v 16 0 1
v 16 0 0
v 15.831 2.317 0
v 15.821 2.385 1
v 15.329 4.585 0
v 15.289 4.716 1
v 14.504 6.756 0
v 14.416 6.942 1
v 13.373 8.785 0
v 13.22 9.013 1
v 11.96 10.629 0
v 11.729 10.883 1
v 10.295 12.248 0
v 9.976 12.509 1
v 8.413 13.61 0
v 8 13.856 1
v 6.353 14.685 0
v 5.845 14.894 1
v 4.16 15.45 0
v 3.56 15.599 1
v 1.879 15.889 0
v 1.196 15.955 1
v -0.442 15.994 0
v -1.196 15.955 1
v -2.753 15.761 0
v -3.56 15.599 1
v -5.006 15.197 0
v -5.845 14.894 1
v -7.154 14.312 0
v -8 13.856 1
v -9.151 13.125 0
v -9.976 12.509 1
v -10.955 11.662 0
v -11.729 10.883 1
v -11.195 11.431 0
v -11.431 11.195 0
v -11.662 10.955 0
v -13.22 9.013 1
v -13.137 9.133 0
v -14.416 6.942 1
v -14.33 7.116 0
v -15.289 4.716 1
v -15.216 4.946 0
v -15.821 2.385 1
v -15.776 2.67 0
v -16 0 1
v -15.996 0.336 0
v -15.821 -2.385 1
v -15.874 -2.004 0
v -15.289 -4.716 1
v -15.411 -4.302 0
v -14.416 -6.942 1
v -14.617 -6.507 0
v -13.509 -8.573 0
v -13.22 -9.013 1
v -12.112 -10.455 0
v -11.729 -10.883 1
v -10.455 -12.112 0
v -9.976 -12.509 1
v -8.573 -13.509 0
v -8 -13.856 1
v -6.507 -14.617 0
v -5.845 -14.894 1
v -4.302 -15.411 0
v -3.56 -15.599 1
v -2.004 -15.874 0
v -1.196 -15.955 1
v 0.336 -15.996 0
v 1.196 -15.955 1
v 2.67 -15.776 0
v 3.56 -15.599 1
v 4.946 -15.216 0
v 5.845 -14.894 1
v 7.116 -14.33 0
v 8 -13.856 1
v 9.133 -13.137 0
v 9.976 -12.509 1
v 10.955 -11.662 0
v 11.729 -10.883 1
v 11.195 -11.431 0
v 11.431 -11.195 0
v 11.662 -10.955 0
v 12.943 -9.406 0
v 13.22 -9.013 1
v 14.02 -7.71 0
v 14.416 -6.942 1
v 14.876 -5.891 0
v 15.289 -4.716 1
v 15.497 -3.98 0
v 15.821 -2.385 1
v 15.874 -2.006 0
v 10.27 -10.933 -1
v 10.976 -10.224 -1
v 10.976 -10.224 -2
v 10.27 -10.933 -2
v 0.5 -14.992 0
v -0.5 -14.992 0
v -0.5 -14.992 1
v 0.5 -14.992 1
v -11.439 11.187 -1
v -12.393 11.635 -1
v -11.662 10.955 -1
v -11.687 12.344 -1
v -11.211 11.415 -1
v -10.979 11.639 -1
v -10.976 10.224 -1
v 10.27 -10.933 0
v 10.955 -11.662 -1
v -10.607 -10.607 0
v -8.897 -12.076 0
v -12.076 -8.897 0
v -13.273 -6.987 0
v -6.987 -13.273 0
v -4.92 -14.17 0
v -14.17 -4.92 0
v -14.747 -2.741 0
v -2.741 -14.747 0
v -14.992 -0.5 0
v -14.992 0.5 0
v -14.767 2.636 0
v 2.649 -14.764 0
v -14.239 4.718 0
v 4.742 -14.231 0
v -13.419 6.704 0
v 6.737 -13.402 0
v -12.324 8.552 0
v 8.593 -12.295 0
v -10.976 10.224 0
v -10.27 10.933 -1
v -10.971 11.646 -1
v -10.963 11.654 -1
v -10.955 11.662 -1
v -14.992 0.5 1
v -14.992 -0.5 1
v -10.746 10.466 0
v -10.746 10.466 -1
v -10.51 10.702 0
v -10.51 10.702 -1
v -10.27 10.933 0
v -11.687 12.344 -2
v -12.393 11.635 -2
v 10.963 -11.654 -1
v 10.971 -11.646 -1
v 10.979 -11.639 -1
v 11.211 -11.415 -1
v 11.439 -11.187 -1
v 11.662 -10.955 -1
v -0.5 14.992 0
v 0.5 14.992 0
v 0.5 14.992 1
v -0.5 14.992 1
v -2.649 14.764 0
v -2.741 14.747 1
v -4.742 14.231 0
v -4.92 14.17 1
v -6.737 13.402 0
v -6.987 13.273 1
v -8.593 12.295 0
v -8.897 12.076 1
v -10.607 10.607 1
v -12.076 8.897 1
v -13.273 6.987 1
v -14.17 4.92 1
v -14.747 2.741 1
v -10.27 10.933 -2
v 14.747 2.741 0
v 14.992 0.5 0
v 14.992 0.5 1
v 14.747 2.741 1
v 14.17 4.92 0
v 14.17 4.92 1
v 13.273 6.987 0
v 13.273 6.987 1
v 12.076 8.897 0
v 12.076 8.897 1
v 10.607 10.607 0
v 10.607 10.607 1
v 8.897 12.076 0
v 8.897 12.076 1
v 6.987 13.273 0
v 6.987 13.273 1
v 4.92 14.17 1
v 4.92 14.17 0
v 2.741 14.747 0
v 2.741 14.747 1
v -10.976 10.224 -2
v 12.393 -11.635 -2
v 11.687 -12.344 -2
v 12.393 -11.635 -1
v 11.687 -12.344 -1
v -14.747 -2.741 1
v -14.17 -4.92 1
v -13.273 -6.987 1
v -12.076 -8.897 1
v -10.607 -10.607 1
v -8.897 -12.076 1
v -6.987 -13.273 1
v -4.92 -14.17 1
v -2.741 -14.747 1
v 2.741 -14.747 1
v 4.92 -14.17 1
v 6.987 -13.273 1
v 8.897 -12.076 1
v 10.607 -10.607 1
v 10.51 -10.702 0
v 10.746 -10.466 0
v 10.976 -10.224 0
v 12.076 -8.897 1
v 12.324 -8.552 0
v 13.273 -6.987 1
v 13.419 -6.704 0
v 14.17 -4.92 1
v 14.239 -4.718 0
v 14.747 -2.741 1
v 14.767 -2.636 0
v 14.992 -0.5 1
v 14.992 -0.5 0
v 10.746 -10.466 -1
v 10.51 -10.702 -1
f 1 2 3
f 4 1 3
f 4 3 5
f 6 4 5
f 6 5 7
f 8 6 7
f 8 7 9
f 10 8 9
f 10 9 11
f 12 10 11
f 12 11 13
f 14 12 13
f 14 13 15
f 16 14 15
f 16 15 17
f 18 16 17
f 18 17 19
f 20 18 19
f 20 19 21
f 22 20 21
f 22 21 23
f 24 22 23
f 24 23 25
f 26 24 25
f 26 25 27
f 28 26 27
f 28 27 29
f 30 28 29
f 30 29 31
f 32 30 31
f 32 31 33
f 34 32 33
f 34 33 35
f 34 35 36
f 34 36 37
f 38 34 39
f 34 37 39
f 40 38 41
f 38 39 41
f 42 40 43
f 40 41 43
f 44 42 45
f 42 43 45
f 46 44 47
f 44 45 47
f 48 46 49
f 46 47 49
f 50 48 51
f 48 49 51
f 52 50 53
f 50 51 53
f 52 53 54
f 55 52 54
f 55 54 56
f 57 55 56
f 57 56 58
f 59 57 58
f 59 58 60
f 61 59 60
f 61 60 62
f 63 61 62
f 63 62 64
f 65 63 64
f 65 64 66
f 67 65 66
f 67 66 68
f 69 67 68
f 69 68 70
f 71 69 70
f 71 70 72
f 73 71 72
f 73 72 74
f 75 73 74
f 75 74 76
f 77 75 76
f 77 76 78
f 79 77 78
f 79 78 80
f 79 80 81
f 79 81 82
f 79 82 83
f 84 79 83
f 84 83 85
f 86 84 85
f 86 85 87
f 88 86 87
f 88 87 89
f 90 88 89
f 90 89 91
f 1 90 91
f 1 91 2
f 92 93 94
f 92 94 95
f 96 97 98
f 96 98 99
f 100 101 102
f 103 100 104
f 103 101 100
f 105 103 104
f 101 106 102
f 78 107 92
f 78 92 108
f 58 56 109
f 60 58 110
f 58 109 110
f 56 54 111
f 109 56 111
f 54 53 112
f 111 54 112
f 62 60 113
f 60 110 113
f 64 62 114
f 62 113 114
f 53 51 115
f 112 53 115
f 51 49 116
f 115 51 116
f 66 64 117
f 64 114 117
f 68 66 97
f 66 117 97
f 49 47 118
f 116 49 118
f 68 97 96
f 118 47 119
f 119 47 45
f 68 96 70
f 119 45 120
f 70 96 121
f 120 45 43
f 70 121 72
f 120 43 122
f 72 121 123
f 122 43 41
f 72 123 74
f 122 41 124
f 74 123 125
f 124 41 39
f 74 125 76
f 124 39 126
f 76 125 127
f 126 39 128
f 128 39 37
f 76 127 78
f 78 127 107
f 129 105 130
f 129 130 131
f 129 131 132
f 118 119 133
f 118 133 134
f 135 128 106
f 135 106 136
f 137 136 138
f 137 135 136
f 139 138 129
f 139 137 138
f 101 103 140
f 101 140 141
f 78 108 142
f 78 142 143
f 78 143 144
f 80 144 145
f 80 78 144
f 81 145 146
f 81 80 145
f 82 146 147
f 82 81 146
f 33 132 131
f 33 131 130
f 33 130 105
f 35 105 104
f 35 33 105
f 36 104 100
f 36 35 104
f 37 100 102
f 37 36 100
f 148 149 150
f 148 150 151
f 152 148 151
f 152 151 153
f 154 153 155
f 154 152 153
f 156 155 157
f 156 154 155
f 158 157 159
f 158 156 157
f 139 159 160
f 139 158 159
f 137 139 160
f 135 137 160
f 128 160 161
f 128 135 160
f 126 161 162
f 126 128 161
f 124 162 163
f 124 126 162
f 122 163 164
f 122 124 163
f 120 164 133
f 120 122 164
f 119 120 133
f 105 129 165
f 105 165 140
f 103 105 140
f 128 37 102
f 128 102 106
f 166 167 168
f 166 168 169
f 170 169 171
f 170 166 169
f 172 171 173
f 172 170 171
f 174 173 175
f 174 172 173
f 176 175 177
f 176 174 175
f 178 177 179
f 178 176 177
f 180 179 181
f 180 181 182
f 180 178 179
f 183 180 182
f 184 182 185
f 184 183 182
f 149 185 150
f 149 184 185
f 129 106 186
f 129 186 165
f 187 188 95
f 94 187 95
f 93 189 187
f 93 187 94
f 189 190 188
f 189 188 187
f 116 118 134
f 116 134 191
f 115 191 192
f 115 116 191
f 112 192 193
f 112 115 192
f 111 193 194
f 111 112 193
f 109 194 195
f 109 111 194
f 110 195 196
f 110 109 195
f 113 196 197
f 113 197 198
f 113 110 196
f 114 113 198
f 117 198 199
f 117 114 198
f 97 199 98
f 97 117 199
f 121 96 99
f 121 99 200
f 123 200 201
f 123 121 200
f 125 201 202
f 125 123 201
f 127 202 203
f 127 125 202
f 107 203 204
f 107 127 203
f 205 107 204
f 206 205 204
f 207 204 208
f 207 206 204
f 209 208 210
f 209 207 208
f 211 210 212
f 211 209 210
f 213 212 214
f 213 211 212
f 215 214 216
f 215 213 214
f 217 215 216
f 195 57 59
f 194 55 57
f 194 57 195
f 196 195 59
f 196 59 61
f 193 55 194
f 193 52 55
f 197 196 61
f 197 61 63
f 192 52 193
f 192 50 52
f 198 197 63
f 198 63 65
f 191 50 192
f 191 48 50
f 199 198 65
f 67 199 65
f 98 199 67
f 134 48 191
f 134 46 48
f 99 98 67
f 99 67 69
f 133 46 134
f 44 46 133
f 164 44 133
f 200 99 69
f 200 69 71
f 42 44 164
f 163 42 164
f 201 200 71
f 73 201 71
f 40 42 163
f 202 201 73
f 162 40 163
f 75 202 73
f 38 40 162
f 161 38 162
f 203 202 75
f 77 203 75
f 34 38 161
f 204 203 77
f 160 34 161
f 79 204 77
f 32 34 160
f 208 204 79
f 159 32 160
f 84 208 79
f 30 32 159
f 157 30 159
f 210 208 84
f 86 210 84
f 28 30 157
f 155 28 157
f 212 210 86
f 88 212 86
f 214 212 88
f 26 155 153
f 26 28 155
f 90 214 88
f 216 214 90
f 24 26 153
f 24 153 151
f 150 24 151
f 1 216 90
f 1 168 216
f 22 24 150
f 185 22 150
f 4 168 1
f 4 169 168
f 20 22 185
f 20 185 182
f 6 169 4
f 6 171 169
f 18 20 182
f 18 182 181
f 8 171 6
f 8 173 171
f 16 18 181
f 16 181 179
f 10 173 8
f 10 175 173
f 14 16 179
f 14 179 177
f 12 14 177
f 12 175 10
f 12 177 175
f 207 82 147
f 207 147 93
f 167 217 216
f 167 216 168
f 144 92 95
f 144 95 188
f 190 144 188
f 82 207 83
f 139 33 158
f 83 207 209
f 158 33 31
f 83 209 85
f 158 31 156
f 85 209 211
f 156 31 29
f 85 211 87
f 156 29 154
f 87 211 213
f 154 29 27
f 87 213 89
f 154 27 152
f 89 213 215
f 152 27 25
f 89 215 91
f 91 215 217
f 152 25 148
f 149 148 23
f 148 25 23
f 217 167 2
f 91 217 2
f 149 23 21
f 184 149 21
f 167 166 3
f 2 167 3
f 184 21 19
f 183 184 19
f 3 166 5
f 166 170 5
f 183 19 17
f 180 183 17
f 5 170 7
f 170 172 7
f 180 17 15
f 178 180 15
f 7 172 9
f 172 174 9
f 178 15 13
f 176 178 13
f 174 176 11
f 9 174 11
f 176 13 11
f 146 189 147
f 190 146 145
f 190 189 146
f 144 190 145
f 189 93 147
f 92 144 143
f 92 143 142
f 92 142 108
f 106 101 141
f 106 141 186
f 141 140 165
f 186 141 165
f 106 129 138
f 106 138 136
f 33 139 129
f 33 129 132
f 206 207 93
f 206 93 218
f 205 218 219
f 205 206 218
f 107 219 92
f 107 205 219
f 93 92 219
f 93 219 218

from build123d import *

# Parameters (mm, degrees)
SKETCH5_R           = 16
BOSS_EXTRUDE1_DEPTH = 1
BOSS_EXTRUDE7_DEPTH = 1
BOSS_EXTRUDE8_DEPTH = 1
CIRPATTERN1_COUNT   = 2


with BuildPart() as part:
    # Sketch5 → Boss-Extrude1 (new body)
    with BuildSketch(Plane.XY):
        Circle(SKETCH5_R)
        with BuildLine():
            Line((-0.5, -14.991664351), (0.5, -14.991664351))
            ThreePointArc((0.5, -14.991664351), (10.606601718, -10.606601718), (14.991664351, -0.5))
            Line((14.991664351, -0.5), (14.991664351, 0.5))
            ThreePointArc((14.991664351, 0.5), (10.606601718, 10.606601718), (0.5, 14.991664351))
            Line((0.5, 14.991664351), (-0.5, 14.991664351))
            ThreePointArc((-0.5, 14.991664351), (-10.606601718, 10.606601718), (-14.991664351, 0.5))
            Line((-14.991664351, 0.5), (-14.991664351, -0.5))
            ThreePointArc((-14.991664351, -0.5), (-10.606601718, -10.606601718), (-0.5, -14.991664351))
        make_face(mode=Mode.SUBTRACT)
    extrude(amount=BOSS_EXTRUDE1_DEPTH)

    # Sketch6 → Boss-Extrude7 (add)
    with BuildSketch(Plane.XY):
        with BuildLine():
            Line((-11.661770518, 10.954593027), (-10.97567443, 10.224214923))
            ThreePointArc((-10.97567443, 10.224214923), (-10.628744174, 10.58441294), (-10.269999326, 10.932845642))
            Line((-10.269999326, 10.932845642), (-10.954665948, 11.661702018))
            ThreePointArc((-10.954665948, 11.661702018), (-11.313743872, 11.313673126), (-11.661770518, 10.954593027))
        make_face()
    boss_extrude7 = extrude(amount=-BOSS_EXTRUDE7_DEPTH)

    # Sketch8 → Boss-Extrude8 (add)
    with BuildSketch(Plane(origin=(0, 0, -1), x_dir=(-1, 0, 0), z_dir=(0, 0, -1))):
        Polygon((10.97567443, 10.224214923), (10.269999326, 10.932845642), (11.687165216, 12.344100701), (12.39284032, 11.635469982), align=None)
    boss_extrude8 = extrude(amount=BOSS_EXTRUDE8_DEPTH)

    # CirPattern1: Boss-Extrude7, Boss-Extrude8 ×2 about axis
    cirpattern1_axis = Axis((0, 0, 0), (0, 0, 1))
    for i in range(1, CIRPATTERN1_COUNT):
        add(boss_extrude7.rotate(cirpattern1_axis, i * 360 / CIRPATTERN1_COUNT))
        add(boss_extrude8.rotate(cirpattern1_axis, i * 360 / CIRPATTERN1_COUNT))


solid = part.part
